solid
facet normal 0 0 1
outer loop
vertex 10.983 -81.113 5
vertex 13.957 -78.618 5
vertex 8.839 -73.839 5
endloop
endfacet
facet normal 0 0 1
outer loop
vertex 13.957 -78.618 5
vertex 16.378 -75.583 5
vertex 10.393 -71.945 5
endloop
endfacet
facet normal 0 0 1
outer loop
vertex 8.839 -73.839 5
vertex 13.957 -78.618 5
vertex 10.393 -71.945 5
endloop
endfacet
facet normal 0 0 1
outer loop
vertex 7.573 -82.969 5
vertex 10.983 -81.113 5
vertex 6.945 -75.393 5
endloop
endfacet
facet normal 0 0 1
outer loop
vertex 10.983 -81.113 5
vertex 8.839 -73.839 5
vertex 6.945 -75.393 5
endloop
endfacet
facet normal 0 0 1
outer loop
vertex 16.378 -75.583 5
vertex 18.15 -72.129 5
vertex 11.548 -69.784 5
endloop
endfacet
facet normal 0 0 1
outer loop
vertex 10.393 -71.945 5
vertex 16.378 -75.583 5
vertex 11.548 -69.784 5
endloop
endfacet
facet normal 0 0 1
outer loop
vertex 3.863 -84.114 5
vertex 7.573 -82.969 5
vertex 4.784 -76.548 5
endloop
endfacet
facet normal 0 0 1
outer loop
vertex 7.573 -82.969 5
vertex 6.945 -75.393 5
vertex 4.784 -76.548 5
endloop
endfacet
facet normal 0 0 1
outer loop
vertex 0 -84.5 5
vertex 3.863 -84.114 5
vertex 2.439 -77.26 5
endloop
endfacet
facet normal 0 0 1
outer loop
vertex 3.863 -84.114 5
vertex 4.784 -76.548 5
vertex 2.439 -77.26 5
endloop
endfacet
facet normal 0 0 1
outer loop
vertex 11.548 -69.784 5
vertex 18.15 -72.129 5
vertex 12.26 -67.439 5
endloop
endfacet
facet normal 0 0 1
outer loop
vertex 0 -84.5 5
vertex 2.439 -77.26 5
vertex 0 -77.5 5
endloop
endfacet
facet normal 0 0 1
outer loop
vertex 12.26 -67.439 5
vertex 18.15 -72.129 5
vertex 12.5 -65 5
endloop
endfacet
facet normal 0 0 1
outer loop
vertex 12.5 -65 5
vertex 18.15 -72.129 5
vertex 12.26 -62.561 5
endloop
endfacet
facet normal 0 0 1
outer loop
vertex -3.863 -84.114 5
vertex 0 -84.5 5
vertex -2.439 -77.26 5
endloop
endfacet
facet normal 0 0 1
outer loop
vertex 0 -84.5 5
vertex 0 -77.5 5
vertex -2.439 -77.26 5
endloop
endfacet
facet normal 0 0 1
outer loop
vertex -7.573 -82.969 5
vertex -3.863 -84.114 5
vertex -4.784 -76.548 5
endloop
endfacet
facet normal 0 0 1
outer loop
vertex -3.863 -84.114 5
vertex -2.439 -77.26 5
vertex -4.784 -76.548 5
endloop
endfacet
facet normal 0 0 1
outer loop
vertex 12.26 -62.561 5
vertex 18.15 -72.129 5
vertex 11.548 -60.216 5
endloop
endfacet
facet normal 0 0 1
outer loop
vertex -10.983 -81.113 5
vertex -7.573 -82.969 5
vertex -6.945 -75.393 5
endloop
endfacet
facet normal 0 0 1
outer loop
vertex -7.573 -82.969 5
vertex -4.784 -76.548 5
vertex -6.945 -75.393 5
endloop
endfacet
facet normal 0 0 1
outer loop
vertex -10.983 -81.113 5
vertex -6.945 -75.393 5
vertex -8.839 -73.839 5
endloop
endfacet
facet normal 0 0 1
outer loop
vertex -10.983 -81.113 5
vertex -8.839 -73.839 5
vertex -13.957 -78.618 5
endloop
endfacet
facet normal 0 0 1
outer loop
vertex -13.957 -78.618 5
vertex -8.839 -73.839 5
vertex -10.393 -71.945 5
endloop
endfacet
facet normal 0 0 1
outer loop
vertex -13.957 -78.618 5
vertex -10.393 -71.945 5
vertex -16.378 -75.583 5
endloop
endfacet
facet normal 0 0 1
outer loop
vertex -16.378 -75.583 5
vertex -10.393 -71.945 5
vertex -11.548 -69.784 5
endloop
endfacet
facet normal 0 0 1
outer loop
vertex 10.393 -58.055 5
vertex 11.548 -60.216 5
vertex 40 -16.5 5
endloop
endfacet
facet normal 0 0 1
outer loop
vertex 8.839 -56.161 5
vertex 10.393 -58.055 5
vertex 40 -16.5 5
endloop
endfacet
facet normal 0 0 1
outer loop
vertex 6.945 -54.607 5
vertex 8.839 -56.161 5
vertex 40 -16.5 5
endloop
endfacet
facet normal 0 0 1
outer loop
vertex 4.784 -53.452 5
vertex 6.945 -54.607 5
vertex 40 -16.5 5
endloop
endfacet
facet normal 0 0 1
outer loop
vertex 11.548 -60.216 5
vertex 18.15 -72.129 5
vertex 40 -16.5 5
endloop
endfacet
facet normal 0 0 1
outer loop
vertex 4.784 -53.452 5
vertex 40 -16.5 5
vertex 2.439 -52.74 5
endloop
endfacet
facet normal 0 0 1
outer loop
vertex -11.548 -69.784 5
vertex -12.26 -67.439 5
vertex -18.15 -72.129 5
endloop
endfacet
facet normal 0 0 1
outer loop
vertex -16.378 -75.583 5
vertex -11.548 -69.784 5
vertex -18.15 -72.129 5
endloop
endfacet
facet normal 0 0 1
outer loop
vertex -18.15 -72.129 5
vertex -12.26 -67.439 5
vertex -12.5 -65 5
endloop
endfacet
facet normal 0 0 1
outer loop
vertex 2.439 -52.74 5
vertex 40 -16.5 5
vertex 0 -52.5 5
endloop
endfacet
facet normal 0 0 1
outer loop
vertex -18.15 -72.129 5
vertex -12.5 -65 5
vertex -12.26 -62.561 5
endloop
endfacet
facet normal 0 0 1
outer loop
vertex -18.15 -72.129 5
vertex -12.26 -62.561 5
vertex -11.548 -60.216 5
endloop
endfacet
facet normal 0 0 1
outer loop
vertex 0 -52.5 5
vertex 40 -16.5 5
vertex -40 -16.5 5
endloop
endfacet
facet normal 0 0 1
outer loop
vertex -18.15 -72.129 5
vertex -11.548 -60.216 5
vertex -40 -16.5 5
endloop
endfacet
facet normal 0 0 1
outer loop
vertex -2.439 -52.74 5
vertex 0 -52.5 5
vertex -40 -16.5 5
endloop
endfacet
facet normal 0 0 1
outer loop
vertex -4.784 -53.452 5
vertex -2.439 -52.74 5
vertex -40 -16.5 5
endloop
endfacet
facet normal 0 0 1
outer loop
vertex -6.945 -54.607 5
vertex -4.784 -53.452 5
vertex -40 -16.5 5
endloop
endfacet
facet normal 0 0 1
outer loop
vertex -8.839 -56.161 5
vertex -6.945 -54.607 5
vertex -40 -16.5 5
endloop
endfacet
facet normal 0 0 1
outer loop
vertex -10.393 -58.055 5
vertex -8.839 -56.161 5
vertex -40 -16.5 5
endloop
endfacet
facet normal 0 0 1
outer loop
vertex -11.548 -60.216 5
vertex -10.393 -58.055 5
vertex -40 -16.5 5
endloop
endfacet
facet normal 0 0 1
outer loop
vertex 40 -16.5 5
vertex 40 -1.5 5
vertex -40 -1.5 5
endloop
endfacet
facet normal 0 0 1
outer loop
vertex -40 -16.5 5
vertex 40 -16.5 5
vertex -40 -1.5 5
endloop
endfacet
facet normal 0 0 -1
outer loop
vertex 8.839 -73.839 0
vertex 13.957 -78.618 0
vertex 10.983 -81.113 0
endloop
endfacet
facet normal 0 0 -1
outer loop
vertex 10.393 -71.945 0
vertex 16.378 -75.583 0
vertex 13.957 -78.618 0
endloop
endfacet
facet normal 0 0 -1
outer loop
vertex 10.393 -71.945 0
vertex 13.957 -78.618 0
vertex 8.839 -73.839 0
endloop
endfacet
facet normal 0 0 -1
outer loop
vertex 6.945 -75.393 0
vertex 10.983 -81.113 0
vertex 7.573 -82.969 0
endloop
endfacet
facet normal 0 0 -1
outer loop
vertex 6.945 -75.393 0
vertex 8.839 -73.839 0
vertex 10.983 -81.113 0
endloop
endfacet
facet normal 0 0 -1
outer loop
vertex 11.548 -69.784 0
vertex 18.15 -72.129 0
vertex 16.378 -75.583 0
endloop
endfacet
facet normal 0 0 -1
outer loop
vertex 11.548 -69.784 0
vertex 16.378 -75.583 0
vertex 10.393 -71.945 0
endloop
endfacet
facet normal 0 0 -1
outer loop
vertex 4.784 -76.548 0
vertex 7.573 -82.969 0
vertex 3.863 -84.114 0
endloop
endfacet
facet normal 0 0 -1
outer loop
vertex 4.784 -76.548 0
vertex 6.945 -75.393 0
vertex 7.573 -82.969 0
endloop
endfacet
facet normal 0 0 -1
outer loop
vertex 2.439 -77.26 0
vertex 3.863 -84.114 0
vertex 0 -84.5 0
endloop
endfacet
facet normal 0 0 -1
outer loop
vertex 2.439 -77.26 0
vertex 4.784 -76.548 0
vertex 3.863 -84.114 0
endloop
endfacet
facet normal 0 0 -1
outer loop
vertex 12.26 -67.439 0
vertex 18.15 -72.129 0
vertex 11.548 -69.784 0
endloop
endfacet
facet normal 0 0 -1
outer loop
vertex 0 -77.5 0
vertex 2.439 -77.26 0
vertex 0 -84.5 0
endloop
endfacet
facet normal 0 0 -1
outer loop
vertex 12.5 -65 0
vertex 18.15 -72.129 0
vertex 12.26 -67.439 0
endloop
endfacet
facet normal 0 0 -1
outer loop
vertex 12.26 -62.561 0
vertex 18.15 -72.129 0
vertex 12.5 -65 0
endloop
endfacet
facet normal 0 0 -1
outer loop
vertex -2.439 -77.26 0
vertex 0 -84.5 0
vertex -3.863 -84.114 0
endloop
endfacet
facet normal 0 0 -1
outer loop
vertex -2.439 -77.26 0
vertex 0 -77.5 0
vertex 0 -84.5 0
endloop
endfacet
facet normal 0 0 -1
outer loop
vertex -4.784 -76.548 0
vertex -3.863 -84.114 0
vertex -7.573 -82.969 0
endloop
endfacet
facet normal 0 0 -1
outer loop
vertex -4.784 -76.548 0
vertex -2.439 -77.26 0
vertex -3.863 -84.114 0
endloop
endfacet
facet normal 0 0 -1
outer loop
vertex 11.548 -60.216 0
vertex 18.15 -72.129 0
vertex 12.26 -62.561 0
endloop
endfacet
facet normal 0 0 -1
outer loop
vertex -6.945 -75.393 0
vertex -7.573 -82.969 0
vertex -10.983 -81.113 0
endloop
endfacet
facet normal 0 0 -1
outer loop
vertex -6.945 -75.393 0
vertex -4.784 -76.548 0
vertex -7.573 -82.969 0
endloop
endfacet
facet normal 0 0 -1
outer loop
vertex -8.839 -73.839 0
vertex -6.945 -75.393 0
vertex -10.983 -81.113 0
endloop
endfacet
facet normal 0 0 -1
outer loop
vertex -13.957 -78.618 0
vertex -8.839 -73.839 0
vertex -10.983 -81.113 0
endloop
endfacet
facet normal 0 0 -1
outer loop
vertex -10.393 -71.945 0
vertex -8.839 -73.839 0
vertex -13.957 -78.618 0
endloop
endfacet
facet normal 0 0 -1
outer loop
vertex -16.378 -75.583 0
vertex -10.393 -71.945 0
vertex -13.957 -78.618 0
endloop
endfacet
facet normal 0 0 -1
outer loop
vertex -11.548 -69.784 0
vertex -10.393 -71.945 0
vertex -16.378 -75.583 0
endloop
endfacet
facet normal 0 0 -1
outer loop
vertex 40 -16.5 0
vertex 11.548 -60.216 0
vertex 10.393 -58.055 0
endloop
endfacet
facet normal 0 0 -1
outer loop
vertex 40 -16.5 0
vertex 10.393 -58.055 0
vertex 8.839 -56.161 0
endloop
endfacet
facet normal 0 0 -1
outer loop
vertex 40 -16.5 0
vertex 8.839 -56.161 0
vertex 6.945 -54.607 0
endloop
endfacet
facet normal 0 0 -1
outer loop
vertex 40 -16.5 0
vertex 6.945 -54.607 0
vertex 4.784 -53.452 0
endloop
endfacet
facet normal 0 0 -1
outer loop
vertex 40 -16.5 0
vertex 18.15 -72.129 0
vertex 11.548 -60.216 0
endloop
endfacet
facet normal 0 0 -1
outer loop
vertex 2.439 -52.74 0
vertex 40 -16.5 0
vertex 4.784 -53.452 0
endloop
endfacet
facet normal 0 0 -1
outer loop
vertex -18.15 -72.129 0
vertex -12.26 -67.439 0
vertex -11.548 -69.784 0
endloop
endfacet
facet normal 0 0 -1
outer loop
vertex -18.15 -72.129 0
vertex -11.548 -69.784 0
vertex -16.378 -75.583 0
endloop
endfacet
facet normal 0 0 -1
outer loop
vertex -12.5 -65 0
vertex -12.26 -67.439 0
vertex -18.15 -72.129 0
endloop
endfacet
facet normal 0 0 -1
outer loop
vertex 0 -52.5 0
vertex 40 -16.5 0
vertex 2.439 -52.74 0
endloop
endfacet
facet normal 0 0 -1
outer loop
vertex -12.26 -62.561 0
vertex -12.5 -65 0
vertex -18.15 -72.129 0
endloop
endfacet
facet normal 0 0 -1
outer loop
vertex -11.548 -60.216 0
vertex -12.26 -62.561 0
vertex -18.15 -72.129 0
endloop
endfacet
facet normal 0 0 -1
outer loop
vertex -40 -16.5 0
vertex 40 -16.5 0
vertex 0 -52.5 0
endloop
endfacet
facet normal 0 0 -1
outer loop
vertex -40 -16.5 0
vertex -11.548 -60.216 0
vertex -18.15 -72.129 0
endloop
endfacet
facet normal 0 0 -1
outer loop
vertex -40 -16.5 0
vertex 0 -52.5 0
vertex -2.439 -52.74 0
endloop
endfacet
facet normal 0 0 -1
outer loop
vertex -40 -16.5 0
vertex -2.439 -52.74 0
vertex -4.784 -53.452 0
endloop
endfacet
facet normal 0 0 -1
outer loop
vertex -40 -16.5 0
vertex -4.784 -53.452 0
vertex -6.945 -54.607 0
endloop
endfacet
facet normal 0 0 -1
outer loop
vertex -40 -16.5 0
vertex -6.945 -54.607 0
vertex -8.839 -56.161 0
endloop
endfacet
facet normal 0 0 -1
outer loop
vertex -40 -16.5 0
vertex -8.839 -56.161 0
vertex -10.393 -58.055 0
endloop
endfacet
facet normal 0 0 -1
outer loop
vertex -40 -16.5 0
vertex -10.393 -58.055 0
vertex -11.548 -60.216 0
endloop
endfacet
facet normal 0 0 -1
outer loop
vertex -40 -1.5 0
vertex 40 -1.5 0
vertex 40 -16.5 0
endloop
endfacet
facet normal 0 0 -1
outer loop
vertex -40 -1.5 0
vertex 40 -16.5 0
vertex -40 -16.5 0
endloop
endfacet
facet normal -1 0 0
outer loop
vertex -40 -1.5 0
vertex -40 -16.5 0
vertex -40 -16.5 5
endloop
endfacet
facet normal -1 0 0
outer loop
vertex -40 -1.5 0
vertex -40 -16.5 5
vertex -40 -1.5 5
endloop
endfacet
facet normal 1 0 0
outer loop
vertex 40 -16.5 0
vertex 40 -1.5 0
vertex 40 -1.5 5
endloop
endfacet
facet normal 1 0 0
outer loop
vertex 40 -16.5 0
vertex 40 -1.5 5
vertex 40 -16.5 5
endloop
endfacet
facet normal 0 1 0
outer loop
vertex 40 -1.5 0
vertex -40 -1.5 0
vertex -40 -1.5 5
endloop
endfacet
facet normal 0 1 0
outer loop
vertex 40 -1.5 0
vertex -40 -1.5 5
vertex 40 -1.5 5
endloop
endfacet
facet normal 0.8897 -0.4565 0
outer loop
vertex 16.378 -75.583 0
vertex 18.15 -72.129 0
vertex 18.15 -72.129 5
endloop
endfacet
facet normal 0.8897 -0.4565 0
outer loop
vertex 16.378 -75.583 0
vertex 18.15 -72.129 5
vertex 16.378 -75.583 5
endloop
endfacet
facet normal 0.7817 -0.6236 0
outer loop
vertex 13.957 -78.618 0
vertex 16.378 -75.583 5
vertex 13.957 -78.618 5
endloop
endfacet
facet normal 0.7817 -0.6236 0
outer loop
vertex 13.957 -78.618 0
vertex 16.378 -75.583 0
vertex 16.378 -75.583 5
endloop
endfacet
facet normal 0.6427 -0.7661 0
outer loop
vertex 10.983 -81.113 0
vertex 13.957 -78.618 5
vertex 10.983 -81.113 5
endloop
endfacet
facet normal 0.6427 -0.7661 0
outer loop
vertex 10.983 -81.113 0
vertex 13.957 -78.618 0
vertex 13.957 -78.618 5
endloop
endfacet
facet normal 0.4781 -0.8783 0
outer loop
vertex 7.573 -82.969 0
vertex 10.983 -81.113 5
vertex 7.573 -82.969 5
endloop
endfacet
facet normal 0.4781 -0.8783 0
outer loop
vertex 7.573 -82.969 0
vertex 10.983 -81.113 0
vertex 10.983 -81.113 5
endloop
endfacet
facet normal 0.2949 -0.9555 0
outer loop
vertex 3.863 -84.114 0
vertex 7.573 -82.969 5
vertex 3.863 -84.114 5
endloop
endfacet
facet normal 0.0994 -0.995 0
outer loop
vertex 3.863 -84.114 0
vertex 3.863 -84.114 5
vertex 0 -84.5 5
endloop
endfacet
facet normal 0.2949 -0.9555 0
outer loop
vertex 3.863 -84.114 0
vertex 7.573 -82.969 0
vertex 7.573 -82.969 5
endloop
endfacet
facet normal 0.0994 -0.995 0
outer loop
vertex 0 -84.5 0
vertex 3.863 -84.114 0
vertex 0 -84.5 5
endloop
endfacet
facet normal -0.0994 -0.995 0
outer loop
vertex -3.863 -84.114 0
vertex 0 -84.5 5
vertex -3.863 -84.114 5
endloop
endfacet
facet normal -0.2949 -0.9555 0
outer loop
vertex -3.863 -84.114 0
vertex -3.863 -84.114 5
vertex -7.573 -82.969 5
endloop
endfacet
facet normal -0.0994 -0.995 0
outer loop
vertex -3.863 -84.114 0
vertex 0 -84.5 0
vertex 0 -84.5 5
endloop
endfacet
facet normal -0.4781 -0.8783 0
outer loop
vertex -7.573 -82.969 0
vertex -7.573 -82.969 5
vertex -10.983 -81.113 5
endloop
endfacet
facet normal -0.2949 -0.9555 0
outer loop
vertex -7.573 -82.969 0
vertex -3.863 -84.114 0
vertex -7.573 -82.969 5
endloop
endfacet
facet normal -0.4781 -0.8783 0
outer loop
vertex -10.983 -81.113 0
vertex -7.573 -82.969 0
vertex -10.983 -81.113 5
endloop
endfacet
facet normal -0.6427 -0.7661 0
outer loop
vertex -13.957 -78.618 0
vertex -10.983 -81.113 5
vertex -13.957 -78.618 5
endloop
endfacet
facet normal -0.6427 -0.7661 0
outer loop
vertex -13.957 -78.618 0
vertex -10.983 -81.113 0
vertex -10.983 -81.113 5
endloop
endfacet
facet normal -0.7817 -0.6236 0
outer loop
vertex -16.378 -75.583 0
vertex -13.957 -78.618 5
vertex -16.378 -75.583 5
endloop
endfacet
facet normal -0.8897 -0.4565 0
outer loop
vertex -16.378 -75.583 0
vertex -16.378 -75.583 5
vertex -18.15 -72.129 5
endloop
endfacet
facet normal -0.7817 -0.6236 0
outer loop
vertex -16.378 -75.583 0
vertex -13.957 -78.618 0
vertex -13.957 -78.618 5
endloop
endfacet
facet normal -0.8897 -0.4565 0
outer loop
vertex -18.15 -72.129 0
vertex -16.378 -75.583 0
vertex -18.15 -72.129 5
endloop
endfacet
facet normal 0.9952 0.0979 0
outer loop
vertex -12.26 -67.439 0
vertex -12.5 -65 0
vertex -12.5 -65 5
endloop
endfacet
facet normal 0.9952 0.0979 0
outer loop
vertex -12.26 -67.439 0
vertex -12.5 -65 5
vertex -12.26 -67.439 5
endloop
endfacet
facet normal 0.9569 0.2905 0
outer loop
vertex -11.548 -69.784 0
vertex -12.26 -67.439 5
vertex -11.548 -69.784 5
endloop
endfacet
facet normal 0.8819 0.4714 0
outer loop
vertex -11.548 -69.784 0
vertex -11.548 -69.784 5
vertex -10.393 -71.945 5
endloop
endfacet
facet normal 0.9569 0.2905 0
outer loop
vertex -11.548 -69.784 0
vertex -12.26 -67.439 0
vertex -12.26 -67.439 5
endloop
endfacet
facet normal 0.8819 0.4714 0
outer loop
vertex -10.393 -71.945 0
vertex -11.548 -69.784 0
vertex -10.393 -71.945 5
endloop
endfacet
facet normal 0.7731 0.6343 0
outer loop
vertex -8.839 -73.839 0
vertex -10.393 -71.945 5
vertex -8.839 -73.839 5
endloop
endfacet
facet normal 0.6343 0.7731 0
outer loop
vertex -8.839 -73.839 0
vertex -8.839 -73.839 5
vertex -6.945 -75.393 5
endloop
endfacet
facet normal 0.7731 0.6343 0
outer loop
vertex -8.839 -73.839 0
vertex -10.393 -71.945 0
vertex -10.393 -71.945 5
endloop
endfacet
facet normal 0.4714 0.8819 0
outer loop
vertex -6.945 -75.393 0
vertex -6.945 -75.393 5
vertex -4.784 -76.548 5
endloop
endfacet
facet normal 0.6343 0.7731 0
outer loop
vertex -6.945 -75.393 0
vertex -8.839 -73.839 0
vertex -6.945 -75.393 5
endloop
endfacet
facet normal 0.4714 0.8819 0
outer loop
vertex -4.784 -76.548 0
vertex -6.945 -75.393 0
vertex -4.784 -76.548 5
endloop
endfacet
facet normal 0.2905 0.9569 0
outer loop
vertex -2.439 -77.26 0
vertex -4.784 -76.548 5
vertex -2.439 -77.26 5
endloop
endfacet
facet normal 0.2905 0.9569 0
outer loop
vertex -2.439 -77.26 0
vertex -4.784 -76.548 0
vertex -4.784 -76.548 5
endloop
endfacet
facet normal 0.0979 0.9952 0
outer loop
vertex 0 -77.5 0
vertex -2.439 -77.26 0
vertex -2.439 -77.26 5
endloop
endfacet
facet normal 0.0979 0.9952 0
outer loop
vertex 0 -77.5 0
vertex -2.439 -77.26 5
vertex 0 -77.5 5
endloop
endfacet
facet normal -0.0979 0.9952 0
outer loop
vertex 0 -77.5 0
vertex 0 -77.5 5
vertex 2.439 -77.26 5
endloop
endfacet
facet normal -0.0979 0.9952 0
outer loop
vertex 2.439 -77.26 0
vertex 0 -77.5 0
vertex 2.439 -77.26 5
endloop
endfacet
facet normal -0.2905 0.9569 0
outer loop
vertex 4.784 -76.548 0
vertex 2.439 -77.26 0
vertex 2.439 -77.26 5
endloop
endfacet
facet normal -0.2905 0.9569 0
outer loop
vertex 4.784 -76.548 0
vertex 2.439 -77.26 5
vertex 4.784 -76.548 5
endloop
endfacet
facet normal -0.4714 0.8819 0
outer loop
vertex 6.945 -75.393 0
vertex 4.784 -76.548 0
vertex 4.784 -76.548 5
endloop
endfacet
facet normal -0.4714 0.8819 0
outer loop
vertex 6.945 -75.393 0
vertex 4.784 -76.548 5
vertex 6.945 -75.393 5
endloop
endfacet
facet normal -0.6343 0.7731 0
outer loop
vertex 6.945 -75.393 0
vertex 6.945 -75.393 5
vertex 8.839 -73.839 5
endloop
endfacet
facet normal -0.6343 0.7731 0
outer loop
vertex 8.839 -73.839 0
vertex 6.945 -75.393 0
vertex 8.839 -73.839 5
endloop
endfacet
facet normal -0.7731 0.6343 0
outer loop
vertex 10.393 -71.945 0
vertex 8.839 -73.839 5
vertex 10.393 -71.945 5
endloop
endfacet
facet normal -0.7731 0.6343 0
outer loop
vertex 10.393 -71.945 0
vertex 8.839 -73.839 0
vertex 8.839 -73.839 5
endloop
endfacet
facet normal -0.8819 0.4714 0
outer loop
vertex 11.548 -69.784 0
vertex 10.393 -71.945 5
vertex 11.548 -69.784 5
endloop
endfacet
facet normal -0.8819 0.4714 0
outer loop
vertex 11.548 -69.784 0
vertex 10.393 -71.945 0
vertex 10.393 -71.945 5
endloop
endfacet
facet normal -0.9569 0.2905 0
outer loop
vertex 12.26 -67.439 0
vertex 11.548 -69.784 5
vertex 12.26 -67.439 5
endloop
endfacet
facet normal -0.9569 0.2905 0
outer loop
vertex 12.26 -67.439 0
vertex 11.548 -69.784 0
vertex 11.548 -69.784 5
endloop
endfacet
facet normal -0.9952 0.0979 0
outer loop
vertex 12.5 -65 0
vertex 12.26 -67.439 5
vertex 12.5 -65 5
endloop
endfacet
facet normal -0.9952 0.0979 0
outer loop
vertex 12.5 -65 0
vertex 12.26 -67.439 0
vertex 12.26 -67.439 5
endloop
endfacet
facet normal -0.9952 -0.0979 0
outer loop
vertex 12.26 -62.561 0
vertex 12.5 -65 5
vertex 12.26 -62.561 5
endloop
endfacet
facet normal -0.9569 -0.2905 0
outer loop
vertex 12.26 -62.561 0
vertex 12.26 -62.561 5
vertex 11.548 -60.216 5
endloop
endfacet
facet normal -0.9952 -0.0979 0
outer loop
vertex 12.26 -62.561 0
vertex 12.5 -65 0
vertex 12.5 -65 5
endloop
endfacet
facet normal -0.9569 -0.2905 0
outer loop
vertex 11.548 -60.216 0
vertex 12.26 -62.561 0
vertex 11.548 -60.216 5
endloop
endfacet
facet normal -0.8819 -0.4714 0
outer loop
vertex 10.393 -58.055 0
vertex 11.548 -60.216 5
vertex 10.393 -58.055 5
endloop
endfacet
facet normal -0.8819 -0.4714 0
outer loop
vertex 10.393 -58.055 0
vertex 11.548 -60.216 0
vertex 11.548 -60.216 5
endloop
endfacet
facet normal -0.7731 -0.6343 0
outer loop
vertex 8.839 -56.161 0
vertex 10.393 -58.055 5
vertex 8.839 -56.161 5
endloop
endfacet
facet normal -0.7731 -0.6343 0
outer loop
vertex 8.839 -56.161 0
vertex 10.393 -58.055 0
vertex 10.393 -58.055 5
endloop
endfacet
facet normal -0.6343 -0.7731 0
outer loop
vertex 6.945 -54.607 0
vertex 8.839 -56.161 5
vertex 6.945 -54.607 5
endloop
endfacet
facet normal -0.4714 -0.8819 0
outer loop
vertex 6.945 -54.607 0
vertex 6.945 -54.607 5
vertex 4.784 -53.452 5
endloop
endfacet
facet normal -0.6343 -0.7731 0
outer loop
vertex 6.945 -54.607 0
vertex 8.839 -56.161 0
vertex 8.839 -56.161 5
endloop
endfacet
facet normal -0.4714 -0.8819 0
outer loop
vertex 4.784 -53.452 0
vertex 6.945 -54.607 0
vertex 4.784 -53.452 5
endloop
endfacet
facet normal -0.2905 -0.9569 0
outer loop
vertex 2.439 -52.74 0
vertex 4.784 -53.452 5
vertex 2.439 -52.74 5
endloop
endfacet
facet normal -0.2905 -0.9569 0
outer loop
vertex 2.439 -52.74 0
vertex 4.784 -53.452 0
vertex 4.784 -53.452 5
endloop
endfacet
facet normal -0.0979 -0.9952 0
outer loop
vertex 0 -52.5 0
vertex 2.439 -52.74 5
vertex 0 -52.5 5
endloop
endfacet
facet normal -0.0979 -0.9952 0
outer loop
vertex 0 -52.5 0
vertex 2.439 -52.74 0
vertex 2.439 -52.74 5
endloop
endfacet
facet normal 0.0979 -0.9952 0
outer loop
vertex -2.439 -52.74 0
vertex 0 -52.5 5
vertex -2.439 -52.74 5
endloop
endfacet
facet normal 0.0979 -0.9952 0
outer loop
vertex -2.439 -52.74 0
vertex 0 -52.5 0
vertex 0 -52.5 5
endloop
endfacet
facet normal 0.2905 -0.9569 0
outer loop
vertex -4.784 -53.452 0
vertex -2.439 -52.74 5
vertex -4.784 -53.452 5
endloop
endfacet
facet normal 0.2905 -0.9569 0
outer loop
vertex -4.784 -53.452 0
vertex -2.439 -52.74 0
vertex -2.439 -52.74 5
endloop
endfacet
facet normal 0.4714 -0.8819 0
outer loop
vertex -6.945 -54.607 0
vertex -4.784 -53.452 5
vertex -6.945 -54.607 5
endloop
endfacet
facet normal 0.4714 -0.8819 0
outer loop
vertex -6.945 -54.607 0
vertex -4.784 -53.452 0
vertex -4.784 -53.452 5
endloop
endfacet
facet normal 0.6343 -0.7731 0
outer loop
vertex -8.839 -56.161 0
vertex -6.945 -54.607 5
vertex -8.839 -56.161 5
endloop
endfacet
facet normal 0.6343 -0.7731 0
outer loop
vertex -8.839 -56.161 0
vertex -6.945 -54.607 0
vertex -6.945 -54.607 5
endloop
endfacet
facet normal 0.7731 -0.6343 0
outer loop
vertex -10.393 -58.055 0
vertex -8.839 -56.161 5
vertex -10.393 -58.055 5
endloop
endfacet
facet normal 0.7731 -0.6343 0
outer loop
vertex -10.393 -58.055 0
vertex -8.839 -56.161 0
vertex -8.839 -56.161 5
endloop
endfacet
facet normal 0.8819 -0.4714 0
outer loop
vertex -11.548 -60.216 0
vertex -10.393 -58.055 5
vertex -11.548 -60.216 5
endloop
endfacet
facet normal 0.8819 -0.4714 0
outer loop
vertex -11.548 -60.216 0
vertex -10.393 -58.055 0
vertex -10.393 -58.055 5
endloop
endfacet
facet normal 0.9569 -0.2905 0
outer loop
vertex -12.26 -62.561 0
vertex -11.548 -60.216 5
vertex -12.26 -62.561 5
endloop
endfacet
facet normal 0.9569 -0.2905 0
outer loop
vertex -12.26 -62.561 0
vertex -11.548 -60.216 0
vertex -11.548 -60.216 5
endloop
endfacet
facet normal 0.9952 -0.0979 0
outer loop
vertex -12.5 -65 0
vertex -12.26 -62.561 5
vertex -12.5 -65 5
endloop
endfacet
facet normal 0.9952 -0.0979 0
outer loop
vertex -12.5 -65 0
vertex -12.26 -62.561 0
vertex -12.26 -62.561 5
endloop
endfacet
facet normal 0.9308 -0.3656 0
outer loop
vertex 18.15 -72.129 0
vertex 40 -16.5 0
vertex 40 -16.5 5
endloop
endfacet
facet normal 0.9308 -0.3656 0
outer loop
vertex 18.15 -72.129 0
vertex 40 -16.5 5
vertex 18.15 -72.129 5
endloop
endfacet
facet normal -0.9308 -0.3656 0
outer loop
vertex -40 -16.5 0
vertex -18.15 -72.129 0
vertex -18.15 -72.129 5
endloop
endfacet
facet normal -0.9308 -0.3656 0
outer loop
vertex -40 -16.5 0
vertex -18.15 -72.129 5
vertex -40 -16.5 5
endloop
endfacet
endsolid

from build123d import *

# Parameters (mm, degrees)
SKETCH_2_R             = 12.5
SM_BASE_FLANGE_1_DEPTH = 5


# Sheet-metal steps are written as plain solids
with BuildPart() as part:
    # Sketch 2 → Базовая кромка1 (new body)
    with BuildSketch(Plane.XY):
        with BuildLine():
            Line((-18.150140865, -72.128982157), (-40, -16.5))
            Line((-40, -16.5), (-40, -1.5))
            Line((-40, -1.5), (40, -1.5))
            Line((40, -1.5), (40, -16.5))
            Line((40, -16.5), (18.150140865, -72.128982157))
            ThreePointArc((18.150140865, -72.128982157), (0, -84.5), (-18.150140865, -72.128982157))
        make_face()
        with Locations(Location((0, -65, 0), (0, 0, 180))):
            Circle(SKETCH_2_R, mode=Mode.SUBTRACT)
    extrude(amount=SM_BASE_FLANGE_1_DEPTH)


solid = part.part
